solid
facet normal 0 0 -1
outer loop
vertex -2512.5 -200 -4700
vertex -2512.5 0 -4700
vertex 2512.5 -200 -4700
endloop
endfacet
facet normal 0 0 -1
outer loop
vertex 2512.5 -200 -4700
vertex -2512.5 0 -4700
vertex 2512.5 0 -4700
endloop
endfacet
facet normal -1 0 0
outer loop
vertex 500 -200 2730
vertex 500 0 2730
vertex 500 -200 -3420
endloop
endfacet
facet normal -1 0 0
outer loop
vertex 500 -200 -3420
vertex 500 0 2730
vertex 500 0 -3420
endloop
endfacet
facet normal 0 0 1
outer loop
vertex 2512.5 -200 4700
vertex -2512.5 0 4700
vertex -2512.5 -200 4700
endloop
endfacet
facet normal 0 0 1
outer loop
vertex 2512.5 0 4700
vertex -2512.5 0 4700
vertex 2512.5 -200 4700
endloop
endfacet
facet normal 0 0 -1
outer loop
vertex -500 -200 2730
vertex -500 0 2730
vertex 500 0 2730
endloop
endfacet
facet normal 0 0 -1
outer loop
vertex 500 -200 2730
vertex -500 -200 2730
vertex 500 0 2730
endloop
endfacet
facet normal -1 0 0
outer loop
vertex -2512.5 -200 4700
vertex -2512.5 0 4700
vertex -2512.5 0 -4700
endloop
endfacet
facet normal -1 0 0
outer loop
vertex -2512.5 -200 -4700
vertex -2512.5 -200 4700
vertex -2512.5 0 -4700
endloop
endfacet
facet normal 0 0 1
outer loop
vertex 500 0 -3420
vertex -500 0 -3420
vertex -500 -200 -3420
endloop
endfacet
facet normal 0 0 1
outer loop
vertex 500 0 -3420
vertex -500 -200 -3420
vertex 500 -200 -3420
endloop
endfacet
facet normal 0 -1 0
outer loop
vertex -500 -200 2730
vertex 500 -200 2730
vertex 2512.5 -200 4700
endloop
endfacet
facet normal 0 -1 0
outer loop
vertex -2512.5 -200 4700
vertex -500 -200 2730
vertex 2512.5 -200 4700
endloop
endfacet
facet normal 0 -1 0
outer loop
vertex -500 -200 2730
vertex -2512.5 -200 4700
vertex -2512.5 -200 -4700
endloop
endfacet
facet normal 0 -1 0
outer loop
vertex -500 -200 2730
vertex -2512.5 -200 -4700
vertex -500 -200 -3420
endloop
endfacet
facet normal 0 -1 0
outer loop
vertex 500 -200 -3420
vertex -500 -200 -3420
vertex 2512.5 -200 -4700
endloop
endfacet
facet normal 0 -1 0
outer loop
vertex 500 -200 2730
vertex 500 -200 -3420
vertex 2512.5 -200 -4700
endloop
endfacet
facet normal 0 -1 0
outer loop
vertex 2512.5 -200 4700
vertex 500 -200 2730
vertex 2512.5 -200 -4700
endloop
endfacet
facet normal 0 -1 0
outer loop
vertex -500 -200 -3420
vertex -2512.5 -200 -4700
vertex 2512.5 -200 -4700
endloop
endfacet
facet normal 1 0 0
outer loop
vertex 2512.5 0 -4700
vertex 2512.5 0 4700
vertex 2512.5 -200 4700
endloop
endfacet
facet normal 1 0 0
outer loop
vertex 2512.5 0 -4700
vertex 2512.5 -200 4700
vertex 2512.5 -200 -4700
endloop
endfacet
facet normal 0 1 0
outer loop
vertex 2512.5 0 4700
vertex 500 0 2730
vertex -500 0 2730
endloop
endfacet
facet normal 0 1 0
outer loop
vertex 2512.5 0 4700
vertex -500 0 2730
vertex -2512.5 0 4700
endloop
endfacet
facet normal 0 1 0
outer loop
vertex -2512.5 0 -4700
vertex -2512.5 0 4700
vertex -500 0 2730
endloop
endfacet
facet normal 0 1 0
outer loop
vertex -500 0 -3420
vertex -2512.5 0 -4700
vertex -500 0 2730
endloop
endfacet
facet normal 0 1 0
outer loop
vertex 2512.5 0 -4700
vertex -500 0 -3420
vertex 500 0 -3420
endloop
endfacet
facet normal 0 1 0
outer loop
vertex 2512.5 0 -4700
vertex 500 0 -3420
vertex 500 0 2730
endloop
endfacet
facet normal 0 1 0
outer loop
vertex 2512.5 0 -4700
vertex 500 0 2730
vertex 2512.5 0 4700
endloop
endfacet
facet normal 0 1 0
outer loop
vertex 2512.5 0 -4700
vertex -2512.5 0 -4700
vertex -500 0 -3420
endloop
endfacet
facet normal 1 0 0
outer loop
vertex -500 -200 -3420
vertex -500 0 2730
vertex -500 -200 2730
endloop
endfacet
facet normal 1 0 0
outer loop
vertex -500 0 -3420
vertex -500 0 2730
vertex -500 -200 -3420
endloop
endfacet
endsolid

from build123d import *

# Parameters (mm, degrees)
SKETCH_1_W          = 5025
SKETCH_1_H          = 9400
EXTRUDE_1_DEPTH     = 200
SKETCH_2_W          = 1000
SKETCH_2_H          = 6150
CUT_EXTRUDE_1_DEPTH = 5334.165687469


with BuildPart() as part:
    # Эскиз1 → Бобышка-Вытянуть1 (new body)
    with BuildSketch(Plane(origin=(0, 0, 0), x_dir=(1, 0, 0), z_dir=(0, 1, 0))):
        Rectangle(SKETCH_1_W, SKETCH_1_H)
    extrude(amount=-EXTRUDE_1_DEPTH)

    # Эскиз2 → Вырез-Вытянуть1 (cut, through all)
    with BuildSketch(Plane(origin=(0, 0, 0), x_dir=(1, 0, 0), z_dir=(0, 1, 0))):
        with Locations((0, 345)):
            Rectangle(SKETCH_2_W, SKETCH_2_H)
    extrude(amount=-CUT_EXTRUDE_1_DEPTH, mode=Mode.SUBTRACT)


solid = part.part
